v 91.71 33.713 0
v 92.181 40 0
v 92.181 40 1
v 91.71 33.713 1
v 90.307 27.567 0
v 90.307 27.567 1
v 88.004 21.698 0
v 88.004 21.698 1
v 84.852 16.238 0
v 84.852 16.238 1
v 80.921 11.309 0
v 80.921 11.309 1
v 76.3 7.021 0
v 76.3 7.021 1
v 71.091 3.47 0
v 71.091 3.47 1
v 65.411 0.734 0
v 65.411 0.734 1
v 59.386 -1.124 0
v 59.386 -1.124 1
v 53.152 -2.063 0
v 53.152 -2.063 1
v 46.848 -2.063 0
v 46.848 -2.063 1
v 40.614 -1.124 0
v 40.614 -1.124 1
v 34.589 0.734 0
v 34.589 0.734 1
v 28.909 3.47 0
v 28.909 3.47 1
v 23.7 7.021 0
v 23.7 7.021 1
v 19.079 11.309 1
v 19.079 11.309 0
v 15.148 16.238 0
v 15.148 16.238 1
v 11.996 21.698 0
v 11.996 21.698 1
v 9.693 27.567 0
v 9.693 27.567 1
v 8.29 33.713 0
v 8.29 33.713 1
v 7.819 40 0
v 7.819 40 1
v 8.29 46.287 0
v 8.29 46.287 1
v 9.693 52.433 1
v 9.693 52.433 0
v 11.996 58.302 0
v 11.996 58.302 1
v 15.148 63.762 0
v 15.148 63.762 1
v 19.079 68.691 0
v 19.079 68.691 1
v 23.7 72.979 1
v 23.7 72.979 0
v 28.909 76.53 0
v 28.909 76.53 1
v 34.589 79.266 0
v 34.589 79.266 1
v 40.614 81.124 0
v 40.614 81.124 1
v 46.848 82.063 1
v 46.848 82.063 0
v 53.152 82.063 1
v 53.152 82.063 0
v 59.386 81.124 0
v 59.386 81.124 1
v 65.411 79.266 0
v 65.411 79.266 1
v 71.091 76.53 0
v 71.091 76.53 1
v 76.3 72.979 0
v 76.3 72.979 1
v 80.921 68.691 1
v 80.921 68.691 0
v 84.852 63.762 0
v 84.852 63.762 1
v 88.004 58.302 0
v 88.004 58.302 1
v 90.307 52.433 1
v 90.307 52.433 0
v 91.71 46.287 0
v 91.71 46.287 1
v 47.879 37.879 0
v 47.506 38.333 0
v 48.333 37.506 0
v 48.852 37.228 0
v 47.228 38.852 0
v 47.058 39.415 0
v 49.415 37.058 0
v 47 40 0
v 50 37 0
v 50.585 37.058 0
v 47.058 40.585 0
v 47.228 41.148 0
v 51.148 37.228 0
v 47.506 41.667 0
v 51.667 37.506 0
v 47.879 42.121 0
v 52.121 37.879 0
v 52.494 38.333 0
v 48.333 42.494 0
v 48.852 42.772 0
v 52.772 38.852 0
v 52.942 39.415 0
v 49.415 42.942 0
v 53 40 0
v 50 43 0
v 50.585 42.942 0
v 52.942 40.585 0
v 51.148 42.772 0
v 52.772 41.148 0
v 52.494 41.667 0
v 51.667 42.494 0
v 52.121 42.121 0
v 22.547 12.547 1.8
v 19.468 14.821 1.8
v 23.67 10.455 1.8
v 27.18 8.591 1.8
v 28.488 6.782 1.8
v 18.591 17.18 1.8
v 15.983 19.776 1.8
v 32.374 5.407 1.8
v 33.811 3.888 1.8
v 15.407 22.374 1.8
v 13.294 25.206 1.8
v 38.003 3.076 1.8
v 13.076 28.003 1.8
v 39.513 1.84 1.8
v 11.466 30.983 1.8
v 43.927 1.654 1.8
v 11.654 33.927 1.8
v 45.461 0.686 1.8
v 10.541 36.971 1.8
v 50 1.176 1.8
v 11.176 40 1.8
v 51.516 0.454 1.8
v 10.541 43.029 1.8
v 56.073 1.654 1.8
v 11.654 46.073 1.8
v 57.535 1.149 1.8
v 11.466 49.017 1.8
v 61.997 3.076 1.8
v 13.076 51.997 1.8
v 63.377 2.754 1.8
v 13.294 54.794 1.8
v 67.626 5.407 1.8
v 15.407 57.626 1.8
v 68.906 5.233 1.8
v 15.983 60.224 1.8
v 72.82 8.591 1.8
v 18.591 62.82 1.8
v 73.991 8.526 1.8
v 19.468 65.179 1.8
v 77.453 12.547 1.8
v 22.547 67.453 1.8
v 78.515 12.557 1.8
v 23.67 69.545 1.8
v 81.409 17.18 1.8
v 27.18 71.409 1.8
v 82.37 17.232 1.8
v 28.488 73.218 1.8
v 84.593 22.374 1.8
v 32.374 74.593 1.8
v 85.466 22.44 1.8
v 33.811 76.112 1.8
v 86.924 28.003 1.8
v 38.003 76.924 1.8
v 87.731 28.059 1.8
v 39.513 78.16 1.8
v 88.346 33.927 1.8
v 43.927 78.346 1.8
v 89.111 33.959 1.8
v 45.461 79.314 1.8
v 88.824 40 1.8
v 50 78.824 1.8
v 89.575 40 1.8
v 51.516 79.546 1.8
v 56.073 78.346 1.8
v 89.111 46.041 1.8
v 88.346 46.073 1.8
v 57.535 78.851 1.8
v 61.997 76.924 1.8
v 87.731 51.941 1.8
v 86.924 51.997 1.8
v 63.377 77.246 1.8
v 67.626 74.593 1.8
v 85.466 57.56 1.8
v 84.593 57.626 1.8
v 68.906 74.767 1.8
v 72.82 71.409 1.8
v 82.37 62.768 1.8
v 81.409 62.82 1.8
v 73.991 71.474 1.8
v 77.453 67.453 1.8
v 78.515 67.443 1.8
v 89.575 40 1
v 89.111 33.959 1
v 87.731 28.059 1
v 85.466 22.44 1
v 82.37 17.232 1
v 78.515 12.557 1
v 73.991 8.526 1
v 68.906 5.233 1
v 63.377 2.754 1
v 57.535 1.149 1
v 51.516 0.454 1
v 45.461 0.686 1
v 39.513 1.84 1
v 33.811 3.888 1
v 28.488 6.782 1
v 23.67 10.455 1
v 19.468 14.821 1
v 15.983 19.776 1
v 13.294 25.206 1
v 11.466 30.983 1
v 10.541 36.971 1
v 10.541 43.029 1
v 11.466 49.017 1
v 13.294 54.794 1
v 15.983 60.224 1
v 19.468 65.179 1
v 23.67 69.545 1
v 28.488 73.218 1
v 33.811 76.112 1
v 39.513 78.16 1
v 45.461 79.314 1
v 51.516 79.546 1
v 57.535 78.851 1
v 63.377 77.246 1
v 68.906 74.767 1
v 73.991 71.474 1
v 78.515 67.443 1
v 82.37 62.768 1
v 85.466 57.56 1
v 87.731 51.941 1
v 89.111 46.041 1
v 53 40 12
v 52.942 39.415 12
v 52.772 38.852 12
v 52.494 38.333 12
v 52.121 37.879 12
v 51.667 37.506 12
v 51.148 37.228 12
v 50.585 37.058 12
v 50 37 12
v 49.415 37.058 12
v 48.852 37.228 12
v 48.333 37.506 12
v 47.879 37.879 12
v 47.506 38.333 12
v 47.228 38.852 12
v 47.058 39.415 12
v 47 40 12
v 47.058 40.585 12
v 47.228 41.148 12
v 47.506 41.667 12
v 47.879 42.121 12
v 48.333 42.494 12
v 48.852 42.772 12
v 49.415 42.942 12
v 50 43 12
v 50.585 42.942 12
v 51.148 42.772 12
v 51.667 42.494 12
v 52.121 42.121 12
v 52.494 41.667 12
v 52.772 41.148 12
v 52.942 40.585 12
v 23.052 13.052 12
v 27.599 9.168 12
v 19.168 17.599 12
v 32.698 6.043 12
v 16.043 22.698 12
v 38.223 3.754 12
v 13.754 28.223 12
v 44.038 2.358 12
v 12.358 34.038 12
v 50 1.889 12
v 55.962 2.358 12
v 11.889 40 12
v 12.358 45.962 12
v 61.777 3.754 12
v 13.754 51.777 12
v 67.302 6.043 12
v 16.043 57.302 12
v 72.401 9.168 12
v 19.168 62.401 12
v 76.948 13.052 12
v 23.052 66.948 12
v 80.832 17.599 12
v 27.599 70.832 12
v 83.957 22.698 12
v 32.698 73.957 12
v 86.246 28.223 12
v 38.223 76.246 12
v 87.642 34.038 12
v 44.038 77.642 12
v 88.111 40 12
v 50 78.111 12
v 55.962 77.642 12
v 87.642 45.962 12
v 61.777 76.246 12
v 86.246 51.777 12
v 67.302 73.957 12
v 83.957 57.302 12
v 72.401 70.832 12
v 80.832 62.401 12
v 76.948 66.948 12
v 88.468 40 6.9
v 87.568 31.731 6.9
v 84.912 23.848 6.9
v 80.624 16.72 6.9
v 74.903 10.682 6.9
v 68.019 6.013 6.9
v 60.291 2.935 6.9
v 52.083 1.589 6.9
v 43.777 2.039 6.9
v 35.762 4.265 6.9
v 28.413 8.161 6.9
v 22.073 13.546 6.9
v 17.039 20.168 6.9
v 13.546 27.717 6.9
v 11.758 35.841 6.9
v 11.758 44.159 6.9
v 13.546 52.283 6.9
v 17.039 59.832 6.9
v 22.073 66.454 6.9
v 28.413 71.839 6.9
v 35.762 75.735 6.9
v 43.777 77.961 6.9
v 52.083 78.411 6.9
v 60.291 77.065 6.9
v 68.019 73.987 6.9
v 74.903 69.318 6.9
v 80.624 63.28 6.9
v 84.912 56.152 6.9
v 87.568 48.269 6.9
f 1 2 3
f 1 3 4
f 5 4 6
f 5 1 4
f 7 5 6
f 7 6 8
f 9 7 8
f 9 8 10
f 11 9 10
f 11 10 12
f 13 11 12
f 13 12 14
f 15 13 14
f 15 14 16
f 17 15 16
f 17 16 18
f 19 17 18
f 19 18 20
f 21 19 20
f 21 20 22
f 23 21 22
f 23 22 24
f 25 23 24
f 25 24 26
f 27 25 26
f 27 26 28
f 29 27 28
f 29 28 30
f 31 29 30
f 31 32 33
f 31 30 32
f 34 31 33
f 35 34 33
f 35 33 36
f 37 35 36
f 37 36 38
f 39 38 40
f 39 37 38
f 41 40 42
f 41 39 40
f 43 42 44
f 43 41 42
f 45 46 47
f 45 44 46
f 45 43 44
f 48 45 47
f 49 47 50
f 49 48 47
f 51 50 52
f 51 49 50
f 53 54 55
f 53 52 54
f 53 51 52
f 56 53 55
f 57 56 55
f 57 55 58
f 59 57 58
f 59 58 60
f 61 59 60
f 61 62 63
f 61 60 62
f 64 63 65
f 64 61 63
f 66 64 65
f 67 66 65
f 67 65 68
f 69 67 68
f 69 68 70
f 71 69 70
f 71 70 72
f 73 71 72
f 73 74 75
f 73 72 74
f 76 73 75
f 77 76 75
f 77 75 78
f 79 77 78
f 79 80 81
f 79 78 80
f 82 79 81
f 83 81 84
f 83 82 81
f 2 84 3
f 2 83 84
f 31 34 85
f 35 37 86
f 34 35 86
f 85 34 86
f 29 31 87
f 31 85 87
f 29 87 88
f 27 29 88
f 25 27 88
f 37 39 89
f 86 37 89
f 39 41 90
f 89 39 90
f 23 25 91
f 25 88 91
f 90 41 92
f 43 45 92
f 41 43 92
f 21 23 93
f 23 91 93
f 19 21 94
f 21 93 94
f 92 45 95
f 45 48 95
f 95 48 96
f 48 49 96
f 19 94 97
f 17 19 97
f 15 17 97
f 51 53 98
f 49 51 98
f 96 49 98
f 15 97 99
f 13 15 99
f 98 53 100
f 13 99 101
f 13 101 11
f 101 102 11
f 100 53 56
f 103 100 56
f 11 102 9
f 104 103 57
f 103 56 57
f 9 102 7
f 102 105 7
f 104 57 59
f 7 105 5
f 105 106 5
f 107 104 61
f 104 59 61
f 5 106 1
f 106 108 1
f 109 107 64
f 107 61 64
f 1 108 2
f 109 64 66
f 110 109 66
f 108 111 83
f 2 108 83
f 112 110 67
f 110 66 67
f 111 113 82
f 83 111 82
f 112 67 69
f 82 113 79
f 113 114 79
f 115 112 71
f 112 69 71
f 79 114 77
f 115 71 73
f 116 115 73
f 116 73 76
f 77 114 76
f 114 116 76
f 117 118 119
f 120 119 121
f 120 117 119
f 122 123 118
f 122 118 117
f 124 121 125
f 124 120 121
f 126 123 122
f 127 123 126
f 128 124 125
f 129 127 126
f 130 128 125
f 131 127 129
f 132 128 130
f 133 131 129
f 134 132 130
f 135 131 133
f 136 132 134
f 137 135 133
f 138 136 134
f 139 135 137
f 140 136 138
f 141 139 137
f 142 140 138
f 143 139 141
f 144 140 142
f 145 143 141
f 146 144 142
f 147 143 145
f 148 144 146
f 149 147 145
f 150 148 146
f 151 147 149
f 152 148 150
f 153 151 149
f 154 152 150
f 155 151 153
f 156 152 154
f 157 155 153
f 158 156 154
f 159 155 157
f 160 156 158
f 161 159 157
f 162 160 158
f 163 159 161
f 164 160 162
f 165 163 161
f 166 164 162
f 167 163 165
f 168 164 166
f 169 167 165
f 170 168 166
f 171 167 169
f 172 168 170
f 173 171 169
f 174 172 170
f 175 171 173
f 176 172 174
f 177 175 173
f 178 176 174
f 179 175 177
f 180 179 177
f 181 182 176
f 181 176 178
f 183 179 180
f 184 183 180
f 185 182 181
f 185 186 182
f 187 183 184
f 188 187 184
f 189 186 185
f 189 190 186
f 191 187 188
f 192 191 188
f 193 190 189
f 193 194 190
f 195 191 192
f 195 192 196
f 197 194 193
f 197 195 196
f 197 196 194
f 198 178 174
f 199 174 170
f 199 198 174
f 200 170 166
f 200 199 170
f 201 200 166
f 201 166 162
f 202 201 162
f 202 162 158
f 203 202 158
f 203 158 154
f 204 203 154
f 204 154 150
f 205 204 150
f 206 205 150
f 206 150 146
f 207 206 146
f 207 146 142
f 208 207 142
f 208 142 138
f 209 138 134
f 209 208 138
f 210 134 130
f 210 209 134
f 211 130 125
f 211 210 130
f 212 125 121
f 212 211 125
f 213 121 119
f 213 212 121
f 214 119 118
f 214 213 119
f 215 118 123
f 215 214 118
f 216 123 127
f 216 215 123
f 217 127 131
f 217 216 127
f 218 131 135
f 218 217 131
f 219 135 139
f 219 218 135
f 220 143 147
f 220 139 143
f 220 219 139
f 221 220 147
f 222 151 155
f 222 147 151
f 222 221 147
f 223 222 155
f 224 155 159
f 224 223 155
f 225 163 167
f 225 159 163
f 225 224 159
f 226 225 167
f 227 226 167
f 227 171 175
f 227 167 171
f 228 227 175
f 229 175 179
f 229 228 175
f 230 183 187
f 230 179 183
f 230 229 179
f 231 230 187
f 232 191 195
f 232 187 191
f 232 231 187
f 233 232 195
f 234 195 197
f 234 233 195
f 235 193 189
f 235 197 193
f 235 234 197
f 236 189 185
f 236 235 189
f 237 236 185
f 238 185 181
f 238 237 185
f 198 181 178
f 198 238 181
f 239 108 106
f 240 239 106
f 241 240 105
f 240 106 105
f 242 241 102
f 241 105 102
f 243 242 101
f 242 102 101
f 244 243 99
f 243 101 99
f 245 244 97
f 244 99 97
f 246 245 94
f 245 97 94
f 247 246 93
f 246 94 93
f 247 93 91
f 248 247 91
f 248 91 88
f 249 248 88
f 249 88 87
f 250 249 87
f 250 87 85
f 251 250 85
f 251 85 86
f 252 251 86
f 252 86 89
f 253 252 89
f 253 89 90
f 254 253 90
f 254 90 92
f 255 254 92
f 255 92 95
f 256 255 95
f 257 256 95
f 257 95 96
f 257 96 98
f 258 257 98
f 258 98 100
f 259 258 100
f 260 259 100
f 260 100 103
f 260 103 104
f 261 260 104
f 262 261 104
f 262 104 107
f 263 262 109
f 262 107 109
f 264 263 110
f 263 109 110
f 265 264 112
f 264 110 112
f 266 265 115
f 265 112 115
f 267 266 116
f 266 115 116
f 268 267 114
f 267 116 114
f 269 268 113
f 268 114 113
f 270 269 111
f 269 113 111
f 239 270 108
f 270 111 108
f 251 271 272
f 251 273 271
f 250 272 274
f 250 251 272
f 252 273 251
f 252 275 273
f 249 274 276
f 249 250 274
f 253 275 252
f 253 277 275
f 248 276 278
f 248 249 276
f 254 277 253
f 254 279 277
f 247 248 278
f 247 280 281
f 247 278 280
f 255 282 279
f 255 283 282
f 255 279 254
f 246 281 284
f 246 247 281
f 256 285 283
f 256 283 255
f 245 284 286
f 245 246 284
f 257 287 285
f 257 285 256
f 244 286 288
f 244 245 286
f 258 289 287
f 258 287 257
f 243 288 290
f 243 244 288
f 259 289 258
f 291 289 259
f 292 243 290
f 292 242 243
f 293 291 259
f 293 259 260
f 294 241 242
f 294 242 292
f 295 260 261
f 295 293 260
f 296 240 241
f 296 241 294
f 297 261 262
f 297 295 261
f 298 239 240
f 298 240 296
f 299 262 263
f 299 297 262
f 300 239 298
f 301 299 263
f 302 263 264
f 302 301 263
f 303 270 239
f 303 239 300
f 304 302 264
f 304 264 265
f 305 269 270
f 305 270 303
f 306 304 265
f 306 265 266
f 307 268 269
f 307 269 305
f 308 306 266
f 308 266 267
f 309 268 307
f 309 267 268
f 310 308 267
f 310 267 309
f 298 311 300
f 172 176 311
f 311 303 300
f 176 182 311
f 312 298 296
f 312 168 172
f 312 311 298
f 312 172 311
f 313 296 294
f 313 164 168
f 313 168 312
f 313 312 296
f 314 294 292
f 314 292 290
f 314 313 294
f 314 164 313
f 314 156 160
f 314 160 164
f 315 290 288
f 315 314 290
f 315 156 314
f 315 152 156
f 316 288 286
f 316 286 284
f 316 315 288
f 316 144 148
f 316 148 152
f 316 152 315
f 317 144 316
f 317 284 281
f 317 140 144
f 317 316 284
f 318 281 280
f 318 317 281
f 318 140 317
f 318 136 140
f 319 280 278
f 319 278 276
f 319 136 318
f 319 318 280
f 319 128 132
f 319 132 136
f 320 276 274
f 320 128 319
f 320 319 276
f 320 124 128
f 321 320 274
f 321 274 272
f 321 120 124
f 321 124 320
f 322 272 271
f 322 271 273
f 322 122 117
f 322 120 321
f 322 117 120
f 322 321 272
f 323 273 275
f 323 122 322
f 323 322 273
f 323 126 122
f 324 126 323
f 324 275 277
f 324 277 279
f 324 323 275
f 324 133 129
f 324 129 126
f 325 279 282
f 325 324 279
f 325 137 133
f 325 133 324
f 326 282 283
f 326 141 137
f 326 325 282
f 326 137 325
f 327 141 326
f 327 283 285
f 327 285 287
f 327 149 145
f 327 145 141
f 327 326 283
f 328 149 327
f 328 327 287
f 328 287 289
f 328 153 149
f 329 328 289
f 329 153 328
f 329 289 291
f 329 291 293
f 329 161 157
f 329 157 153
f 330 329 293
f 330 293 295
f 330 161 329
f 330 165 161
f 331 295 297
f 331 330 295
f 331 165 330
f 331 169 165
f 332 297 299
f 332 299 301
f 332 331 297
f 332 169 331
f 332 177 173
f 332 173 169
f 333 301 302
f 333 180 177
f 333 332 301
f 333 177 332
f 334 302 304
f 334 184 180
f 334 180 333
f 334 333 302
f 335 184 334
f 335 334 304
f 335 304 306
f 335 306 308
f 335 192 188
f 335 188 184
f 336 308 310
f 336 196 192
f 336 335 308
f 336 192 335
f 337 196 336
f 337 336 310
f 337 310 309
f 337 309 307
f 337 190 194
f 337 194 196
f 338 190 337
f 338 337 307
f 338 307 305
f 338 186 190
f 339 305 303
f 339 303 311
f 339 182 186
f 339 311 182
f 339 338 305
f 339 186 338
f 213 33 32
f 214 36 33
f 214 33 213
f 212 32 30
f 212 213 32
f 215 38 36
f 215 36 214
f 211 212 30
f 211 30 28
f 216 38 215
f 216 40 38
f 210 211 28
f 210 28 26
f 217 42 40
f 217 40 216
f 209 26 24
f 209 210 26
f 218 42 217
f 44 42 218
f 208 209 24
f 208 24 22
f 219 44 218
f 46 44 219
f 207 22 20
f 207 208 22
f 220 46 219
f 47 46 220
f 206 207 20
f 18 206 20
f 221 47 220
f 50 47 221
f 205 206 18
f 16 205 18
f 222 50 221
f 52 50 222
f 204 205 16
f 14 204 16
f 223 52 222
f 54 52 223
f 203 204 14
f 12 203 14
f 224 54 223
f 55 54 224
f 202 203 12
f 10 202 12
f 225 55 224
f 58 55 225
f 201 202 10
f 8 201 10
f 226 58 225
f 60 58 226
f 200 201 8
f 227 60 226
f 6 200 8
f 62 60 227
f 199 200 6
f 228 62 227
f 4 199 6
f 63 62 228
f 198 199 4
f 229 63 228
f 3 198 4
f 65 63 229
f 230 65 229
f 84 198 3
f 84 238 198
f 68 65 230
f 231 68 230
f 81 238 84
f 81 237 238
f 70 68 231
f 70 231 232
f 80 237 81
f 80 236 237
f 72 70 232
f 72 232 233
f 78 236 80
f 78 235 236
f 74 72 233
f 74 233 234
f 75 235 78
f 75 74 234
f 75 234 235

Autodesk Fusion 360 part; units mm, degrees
sketch "Sketch1" plane through (0, 0, 0) normal (0, 0, 1) x (1, 0, 0)
  line L0 (0, 0) -> (200, 0)
  line L1 (200, 0) -> (200, 200)
  line L2 (200, 200) -> (0, 200)
  line L3 (0, 200) -> (0, 0)
  dimension "d1" = 200
  dimension "d2" = 200
extrude "Extrude1" add sketch "Sketch1" along normal blind 12 makes body 1
sketch "Sketch2" plane through (0, 0, 0) normal (0, 0, 1) x (1, 0, 0)
  circle A0 centre (50, 40) radius 38.95
  circle A1 centre (50, 40) radius 39.575
  circle A2 centre (50, 40) radius 39.325
  dimension "d5" = 77.9
  dimension "d6" = 79.15
  dimension "d15" = 78.65
extrude "Extrude2" add sketch "Sketch2" along normal blind 0.1 separate body contours A0 | A1 | A2 makes body 2
extrude "Extrude3" cut sketch "Sketch2" along normal blind 2.55 contours A1 | A2 bodies 2
extrude "Extrude5" add sketch "Sketch2" along normal blind 3.8 contours A1 | A2 bodies 2
extrude "Extrude4" cut sketch "Sketch2" along normal blind 2.55 contours A2 bodies 2 makes body 3 at (55.9532, 44.0588, 0)
extrude "Extrude6" add sketch "Sketch2" along normal blind 0.1 contours A2 bodies 2 3
extrude "Extrude7" add sketch "Sketch2" along normal blind 3 separate body contours A2 makes body 4
move_body "Move1" bodies 4 to x (1, 0, 0) y (0, 1, 0) z (0, 0, 1) at (0, 0, 3.55)
combine "Combine1" operation cut target body 2 tool bodies 4
extrude "Extrude8" cut 1 faces at (88.1759, 49.7182, 3.8) along direction (0, 0, -1) blind 0.24 on bodies 2 bodies 2
extrude "Extrude9" add 1 faces at (88.1759, 49.7182, 3.56) along direction (0, 0, 1) blind 1.5 on bodies 2 bodies 2
copy_body "CopyPasteBodies1" bodies 1 makes body 5
extrude "Extrude10" cut sketch "Sketch2" along normal blind 25 contours A0 | A1 | A2 keep common part bodies 5
extrude "Extrude11" add sketch "Sketch2" along normal blind 20 separate body contours A1 | A2 makes body 6
move_body "Move2" bodies 6 to x (1, 0, 0) y (0, 1, 0) z (0, 0, 1) at (0, 0, 1.8)
combine "Combine2" operation cut target body 5 tool bodies 6
draft "Draft2" angle -4 neutral plane through (0, 0, 0) pull (0, 0, -1) 1 faces at (88.7564, 43.8782, 8.6) on bodies 5
sketch "AirHole" plane through (0, 0, 0) normal (0, 0, 1) x (1, 0, 0)
  circle A0 centre (50, 40) radius 3
  circle A1 centre (50, 40) radius 0.5
  dimension "d28" = 6
  dimension "d29" = 1
extrude "Extrude12" cut sketch "AirHole" along normal blind 26 contours A0 | A1 bodies 5
sketch "Sketch4" plane through (0, 0, 0) normal (0, 0, 1) x (1, 0, 0)
  circle A0 centre (50, 40) radius 42.1814
extrude "Extrude13" add sketch "Sketch4" along normal blind 1 bodies 5
extrude "Extrude14" cut sketch "AirHole" along normal blind 15 contours A0 | A1 bodies 5
sketch "Sketch5" plane through (0, 0, 0) normal (1, 0, 0) x (0, 1, 0)
sketch "Sketch6" plane through (0, 0, 0) normal (1, 0, 0) x (0, 1, 0)
sketch "Sketch7" plane through (0, 0, 0) normal (0, 0, 1) x (1, 0, 0)
  circle A0 centre (50, 40) radius 42.2
  circle A1 centre (50, 40) radius 42.2
  circle A2 centre (50, 40) radius 48.2
  circle A3 centre (50, 40) radius 55.2268
  dimension "d41" = 84.4
  dimension "d42" = 96.4
extrude "Extrude15" add sketch "Sketch7" along normal blind 12 separate body contours A3 makes body 7
hidden bodies 1 2 7
equation "d3 = WoodHeight"
equation "d5 = d6 - 1.25 mm"
equation "d15 = d6 - 0.5 mm"
equation "WoodHeight = 12 mm"
equation "d42 = d41 + 12 mm"
equation "CutDim = 6 mm"
equation "d44 = WoodHeight"
